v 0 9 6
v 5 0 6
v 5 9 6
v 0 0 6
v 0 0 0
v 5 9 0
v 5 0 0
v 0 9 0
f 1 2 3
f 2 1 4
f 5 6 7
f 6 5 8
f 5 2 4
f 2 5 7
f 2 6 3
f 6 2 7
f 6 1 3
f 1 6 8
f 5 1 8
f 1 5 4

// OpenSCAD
translate([2.5, 4.5, 3.0]) color([0.3026706606385793, 0.8355597356596641, 0.2992255048060537]) cube([5, 9, 6], center=true);
